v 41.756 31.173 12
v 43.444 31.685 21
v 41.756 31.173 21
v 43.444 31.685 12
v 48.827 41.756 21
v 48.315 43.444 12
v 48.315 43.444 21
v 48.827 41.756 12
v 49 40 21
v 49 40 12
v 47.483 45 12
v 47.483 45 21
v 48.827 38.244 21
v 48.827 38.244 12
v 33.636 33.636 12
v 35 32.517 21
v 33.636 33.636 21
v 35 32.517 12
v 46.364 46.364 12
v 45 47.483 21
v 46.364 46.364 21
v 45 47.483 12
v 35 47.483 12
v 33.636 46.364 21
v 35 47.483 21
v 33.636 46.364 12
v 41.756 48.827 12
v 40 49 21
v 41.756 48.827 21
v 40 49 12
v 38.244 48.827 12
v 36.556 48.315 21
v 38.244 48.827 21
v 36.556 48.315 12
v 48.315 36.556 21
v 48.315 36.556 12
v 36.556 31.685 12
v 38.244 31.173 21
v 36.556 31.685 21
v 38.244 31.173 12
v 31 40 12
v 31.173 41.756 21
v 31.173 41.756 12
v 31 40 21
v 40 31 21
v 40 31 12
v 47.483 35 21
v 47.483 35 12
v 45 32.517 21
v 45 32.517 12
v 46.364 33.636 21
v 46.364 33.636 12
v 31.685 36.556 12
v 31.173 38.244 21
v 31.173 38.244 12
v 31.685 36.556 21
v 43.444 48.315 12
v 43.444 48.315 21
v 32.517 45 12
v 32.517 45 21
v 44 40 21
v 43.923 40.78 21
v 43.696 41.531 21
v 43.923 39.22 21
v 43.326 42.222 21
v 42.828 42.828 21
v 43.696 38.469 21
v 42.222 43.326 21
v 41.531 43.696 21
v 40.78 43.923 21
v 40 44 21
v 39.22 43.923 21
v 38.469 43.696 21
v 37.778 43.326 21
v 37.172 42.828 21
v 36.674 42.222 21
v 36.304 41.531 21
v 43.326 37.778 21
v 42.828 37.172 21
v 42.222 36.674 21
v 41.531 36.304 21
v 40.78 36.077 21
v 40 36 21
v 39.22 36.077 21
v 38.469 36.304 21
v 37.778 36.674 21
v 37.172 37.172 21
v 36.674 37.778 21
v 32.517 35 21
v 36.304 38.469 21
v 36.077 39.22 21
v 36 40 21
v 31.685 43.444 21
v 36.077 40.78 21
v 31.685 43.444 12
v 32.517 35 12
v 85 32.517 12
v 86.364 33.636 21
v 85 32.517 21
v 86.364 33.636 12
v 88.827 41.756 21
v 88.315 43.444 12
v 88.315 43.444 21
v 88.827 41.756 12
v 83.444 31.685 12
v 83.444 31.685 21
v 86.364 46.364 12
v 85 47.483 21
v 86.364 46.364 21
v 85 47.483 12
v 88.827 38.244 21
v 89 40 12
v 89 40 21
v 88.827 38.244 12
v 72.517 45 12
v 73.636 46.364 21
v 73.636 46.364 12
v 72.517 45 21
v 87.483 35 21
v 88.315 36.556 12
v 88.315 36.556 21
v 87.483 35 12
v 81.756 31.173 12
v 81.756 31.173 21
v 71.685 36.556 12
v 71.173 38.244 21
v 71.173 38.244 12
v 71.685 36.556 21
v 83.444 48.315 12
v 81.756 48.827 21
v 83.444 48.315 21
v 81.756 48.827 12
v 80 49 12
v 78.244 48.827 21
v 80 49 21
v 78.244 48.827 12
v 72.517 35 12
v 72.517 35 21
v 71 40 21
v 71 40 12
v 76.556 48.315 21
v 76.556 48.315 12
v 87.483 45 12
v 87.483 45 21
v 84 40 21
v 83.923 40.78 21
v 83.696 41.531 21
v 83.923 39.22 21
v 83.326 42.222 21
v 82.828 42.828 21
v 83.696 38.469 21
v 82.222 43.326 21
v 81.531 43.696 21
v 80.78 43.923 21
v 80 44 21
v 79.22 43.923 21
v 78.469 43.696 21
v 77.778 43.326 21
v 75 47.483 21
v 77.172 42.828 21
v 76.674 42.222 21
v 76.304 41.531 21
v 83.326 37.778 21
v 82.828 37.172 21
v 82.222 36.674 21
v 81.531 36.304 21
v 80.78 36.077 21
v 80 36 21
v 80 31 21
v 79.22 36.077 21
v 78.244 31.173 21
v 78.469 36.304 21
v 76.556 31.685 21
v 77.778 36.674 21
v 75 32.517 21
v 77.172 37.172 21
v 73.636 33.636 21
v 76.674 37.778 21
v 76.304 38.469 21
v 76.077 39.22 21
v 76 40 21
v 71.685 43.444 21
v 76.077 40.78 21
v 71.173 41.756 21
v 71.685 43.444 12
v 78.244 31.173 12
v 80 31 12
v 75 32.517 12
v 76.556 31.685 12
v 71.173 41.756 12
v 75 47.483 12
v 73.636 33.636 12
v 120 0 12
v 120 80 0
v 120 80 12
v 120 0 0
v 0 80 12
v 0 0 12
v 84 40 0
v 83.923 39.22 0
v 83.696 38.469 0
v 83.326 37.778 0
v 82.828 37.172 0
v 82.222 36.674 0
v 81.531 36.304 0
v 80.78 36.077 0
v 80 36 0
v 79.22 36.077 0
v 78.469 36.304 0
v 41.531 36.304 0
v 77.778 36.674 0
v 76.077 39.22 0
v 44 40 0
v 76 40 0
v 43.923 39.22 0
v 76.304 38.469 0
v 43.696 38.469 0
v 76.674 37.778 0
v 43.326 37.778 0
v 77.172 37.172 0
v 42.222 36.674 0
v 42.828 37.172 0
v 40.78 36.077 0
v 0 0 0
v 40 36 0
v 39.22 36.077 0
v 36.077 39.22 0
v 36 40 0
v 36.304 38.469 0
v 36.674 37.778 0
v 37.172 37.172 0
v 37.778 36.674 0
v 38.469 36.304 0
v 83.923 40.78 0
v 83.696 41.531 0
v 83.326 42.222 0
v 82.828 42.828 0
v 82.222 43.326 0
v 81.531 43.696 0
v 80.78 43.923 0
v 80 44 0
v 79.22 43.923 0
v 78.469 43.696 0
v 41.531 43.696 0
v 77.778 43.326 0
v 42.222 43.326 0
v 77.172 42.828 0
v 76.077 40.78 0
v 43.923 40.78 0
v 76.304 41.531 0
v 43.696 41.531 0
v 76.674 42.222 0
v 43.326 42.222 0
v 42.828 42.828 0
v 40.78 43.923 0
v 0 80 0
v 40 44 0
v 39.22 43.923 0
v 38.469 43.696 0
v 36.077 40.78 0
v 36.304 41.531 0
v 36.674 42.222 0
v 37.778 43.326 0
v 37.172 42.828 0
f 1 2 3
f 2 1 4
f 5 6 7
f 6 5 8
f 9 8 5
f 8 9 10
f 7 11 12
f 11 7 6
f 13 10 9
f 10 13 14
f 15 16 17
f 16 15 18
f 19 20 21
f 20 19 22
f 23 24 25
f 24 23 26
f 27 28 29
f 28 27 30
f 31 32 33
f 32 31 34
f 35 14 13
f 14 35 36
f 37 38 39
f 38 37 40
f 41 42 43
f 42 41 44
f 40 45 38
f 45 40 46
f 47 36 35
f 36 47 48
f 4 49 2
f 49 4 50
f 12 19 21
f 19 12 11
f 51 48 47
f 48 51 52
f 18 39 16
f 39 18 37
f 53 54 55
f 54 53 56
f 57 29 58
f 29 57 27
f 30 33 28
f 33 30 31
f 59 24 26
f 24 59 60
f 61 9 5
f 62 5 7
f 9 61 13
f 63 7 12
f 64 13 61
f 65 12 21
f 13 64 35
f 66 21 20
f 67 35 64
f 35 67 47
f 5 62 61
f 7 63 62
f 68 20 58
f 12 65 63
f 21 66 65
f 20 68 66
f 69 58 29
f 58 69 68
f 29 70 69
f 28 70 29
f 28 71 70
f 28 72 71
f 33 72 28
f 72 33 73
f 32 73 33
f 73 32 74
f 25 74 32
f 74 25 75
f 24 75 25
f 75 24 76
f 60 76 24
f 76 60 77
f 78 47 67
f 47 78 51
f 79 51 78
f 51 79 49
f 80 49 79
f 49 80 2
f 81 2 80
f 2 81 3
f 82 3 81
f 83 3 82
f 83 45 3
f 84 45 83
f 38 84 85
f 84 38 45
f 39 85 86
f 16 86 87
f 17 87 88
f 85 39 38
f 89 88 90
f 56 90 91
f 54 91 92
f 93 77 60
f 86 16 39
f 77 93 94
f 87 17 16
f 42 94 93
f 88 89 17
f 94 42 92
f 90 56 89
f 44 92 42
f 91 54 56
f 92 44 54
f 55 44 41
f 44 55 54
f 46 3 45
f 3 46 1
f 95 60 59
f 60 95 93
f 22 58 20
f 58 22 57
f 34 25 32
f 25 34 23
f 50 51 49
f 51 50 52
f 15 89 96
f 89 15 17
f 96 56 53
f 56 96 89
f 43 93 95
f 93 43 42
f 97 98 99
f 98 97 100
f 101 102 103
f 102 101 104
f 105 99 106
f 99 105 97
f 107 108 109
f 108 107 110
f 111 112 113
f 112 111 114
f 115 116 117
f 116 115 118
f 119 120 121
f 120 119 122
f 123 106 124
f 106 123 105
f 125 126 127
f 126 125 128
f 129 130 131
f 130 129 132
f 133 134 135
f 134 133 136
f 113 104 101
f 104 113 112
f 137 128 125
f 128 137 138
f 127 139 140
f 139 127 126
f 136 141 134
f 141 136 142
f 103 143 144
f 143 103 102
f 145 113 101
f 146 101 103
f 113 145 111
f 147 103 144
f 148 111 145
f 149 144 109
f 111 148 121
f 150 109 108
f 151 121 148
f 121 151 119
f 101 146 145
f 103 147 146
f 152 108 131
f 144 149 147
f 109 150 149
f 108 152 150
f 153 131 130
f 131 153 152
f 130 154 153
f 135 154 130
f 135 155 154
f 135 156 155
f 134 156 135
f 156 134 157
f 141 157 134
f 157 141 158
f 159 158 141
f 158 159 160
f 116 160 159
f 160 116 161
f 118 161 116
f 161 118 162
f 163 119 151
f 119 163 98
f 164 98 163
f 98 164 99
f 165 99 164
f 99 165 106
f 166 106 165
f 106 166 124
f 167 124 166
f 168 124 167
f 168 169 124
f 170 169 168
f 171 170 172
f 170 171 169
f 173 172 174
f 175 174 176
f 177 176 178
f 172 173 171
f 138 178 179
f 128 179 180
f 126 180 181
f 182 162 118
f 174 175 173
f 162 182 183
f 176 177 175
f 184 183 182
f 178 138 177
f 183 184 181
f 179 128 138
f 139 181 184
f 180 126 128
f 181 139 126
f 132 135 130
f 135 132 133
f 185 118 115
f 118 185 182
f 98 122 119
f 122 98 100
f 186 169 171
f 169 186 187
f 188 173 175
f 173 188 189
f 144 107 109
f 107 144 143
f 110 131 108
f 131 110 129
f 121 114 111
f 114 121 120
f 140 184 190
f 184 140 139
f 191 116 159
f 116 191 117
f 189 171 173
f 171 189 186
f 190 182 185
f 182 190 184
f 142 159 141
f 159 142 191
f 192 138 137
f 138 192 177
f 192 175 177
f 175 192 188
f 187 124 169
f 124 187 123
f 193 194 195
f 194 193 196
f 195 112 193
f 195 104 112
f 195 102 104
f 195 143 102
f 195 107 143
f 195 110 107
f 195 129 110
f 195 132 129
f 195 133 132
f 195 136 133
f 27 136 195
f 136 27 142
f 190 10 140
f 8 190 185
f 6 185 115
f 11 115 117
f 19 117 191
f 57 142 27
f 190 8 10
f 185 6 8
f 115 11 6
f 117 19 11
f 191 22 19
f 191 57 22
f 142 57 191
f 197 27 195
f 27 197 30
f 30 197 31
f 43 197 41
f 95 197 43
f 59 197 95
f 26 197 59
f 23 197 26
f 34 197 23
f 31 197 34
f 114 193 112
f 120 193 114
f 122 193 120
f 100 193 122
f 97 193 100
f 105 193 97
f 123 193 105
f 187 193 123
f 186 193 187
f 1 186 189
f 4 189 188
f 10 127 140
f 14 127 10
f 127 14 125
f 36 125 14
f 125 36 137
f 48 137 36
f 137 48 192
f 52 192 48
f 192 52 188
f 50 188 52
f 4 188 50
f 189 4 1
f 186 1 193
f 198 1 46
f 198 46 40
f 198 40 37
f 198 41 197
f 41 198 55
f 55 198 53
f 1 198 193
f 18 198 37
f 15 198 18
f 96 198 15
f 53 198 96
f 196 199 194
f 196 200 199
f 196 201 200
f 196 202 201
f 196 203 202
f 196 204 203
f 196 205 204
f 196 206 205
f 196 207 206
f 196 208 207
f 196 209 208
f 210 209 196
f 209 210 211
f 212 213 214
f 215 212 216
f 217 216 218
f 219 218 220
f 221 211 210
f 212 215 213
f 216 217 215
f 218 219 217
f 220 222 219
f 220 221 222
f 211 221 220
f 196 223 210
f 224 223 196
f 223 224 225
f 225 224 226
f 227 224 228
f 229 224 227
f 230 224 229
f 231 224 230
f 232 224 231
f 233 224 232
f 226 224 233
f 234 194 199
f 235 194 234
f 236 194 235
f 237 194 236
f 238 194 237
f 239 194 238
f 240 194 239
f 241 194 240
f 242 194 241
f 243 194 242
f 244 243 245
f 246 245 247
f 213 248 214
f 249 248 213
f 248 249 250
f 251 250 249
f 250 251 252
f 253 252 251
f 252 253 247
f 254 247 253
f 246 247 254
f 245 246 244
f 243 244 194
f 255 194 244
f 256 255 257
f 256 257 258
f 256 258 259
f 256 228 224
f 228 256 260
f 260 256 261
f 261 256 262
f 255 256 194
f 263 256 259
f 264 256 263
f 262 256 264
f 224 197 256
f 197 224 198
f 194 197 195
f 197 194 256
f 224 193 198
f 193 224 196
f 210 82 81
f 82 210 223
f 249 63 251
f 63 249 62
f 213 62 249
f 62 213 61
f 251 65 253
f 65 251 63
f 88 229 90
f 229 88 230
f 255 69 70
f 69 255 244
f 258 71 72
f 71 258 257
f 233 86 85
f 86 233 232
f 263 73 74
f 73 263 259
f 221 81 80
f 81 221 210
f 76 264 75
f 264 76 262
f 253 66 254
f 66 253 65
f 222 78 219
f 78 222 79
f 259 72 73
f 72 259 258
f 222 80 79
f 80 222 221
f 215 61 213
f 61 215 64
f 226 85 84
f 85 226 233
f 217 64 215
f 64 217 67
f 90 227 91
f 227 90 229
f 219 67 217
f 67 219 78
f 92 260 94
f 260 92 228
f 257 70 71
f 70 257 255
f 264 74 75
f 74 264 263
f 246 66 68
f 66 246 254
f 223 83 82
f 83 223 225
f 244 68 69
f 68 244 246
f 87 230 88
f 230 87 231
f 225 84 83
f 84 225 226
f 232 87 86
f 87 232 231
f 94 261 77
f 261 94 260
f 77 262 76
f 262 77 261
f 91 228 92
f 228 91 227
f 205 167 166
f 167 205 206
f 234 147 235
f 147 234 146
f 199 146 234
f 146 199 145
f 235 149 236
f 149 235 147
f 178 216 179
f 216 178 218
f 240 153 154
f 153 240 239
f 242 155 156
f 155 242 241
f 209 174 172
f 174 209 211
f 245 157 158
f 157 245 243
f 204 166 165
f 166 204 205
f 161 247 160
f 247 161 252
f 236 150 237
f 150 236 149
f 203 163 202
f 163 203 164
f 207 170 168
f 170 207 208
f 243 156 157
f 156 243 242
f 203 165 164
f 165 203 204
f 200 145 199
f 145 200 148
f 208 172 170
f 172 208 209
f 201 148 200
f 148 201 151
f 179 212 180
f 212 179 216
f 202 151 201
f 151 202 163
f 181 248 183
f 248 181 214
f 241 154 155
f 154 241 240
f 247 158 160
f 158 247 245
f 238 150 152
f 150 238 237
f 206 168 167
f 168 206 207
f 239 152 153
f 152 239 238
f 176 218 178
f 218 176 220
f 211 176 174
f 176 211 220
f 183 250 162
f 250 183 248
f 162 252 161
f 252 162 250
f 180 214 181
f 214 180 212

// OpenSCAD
$fn = 32;

// ----------------------------------------------------------------------
// Drill jig: two_boss jig
// ----------------------------------------------------------------------

// --- parameters (mm) ---
plate_l = 120;            // plate length, X
plate_w = 80;             // plate width, Y
plate_t = 12;             // plate thickness
boss_d = 18;              // guide boss diameter
boss_h = 10;              // boss height above the plate
guide_d = 8;              // guide hole diameter
boss_pitch = 40;          // boss pitch

n_boss = 2;  // guide bosses
boss_x0 = (plate_l - (n_boss - 1) * boss_pitch) / 2;  // first boss X
boss_top = plate_t - 1 + boss_h;  // boss crown height
total_h = boss_top;  // overall height

difference() {
  union() {
  cube([plate_l, plate_w, plate_t]);
  for (i = [0 : n_boss - 1])
    translate([boss_x0 + i * boss_pitch, plate_w / 2, plate_t - 1])
      cylinder(h = boss_h, d = boss_d);
  }
  for (i = [0 : n_boss - 1])
    translate([boss_x0 + i * boss_pitch, plate_w / 2, -1])
      cylinder(h = plate_t + boss_h, d = guide_d);
}
